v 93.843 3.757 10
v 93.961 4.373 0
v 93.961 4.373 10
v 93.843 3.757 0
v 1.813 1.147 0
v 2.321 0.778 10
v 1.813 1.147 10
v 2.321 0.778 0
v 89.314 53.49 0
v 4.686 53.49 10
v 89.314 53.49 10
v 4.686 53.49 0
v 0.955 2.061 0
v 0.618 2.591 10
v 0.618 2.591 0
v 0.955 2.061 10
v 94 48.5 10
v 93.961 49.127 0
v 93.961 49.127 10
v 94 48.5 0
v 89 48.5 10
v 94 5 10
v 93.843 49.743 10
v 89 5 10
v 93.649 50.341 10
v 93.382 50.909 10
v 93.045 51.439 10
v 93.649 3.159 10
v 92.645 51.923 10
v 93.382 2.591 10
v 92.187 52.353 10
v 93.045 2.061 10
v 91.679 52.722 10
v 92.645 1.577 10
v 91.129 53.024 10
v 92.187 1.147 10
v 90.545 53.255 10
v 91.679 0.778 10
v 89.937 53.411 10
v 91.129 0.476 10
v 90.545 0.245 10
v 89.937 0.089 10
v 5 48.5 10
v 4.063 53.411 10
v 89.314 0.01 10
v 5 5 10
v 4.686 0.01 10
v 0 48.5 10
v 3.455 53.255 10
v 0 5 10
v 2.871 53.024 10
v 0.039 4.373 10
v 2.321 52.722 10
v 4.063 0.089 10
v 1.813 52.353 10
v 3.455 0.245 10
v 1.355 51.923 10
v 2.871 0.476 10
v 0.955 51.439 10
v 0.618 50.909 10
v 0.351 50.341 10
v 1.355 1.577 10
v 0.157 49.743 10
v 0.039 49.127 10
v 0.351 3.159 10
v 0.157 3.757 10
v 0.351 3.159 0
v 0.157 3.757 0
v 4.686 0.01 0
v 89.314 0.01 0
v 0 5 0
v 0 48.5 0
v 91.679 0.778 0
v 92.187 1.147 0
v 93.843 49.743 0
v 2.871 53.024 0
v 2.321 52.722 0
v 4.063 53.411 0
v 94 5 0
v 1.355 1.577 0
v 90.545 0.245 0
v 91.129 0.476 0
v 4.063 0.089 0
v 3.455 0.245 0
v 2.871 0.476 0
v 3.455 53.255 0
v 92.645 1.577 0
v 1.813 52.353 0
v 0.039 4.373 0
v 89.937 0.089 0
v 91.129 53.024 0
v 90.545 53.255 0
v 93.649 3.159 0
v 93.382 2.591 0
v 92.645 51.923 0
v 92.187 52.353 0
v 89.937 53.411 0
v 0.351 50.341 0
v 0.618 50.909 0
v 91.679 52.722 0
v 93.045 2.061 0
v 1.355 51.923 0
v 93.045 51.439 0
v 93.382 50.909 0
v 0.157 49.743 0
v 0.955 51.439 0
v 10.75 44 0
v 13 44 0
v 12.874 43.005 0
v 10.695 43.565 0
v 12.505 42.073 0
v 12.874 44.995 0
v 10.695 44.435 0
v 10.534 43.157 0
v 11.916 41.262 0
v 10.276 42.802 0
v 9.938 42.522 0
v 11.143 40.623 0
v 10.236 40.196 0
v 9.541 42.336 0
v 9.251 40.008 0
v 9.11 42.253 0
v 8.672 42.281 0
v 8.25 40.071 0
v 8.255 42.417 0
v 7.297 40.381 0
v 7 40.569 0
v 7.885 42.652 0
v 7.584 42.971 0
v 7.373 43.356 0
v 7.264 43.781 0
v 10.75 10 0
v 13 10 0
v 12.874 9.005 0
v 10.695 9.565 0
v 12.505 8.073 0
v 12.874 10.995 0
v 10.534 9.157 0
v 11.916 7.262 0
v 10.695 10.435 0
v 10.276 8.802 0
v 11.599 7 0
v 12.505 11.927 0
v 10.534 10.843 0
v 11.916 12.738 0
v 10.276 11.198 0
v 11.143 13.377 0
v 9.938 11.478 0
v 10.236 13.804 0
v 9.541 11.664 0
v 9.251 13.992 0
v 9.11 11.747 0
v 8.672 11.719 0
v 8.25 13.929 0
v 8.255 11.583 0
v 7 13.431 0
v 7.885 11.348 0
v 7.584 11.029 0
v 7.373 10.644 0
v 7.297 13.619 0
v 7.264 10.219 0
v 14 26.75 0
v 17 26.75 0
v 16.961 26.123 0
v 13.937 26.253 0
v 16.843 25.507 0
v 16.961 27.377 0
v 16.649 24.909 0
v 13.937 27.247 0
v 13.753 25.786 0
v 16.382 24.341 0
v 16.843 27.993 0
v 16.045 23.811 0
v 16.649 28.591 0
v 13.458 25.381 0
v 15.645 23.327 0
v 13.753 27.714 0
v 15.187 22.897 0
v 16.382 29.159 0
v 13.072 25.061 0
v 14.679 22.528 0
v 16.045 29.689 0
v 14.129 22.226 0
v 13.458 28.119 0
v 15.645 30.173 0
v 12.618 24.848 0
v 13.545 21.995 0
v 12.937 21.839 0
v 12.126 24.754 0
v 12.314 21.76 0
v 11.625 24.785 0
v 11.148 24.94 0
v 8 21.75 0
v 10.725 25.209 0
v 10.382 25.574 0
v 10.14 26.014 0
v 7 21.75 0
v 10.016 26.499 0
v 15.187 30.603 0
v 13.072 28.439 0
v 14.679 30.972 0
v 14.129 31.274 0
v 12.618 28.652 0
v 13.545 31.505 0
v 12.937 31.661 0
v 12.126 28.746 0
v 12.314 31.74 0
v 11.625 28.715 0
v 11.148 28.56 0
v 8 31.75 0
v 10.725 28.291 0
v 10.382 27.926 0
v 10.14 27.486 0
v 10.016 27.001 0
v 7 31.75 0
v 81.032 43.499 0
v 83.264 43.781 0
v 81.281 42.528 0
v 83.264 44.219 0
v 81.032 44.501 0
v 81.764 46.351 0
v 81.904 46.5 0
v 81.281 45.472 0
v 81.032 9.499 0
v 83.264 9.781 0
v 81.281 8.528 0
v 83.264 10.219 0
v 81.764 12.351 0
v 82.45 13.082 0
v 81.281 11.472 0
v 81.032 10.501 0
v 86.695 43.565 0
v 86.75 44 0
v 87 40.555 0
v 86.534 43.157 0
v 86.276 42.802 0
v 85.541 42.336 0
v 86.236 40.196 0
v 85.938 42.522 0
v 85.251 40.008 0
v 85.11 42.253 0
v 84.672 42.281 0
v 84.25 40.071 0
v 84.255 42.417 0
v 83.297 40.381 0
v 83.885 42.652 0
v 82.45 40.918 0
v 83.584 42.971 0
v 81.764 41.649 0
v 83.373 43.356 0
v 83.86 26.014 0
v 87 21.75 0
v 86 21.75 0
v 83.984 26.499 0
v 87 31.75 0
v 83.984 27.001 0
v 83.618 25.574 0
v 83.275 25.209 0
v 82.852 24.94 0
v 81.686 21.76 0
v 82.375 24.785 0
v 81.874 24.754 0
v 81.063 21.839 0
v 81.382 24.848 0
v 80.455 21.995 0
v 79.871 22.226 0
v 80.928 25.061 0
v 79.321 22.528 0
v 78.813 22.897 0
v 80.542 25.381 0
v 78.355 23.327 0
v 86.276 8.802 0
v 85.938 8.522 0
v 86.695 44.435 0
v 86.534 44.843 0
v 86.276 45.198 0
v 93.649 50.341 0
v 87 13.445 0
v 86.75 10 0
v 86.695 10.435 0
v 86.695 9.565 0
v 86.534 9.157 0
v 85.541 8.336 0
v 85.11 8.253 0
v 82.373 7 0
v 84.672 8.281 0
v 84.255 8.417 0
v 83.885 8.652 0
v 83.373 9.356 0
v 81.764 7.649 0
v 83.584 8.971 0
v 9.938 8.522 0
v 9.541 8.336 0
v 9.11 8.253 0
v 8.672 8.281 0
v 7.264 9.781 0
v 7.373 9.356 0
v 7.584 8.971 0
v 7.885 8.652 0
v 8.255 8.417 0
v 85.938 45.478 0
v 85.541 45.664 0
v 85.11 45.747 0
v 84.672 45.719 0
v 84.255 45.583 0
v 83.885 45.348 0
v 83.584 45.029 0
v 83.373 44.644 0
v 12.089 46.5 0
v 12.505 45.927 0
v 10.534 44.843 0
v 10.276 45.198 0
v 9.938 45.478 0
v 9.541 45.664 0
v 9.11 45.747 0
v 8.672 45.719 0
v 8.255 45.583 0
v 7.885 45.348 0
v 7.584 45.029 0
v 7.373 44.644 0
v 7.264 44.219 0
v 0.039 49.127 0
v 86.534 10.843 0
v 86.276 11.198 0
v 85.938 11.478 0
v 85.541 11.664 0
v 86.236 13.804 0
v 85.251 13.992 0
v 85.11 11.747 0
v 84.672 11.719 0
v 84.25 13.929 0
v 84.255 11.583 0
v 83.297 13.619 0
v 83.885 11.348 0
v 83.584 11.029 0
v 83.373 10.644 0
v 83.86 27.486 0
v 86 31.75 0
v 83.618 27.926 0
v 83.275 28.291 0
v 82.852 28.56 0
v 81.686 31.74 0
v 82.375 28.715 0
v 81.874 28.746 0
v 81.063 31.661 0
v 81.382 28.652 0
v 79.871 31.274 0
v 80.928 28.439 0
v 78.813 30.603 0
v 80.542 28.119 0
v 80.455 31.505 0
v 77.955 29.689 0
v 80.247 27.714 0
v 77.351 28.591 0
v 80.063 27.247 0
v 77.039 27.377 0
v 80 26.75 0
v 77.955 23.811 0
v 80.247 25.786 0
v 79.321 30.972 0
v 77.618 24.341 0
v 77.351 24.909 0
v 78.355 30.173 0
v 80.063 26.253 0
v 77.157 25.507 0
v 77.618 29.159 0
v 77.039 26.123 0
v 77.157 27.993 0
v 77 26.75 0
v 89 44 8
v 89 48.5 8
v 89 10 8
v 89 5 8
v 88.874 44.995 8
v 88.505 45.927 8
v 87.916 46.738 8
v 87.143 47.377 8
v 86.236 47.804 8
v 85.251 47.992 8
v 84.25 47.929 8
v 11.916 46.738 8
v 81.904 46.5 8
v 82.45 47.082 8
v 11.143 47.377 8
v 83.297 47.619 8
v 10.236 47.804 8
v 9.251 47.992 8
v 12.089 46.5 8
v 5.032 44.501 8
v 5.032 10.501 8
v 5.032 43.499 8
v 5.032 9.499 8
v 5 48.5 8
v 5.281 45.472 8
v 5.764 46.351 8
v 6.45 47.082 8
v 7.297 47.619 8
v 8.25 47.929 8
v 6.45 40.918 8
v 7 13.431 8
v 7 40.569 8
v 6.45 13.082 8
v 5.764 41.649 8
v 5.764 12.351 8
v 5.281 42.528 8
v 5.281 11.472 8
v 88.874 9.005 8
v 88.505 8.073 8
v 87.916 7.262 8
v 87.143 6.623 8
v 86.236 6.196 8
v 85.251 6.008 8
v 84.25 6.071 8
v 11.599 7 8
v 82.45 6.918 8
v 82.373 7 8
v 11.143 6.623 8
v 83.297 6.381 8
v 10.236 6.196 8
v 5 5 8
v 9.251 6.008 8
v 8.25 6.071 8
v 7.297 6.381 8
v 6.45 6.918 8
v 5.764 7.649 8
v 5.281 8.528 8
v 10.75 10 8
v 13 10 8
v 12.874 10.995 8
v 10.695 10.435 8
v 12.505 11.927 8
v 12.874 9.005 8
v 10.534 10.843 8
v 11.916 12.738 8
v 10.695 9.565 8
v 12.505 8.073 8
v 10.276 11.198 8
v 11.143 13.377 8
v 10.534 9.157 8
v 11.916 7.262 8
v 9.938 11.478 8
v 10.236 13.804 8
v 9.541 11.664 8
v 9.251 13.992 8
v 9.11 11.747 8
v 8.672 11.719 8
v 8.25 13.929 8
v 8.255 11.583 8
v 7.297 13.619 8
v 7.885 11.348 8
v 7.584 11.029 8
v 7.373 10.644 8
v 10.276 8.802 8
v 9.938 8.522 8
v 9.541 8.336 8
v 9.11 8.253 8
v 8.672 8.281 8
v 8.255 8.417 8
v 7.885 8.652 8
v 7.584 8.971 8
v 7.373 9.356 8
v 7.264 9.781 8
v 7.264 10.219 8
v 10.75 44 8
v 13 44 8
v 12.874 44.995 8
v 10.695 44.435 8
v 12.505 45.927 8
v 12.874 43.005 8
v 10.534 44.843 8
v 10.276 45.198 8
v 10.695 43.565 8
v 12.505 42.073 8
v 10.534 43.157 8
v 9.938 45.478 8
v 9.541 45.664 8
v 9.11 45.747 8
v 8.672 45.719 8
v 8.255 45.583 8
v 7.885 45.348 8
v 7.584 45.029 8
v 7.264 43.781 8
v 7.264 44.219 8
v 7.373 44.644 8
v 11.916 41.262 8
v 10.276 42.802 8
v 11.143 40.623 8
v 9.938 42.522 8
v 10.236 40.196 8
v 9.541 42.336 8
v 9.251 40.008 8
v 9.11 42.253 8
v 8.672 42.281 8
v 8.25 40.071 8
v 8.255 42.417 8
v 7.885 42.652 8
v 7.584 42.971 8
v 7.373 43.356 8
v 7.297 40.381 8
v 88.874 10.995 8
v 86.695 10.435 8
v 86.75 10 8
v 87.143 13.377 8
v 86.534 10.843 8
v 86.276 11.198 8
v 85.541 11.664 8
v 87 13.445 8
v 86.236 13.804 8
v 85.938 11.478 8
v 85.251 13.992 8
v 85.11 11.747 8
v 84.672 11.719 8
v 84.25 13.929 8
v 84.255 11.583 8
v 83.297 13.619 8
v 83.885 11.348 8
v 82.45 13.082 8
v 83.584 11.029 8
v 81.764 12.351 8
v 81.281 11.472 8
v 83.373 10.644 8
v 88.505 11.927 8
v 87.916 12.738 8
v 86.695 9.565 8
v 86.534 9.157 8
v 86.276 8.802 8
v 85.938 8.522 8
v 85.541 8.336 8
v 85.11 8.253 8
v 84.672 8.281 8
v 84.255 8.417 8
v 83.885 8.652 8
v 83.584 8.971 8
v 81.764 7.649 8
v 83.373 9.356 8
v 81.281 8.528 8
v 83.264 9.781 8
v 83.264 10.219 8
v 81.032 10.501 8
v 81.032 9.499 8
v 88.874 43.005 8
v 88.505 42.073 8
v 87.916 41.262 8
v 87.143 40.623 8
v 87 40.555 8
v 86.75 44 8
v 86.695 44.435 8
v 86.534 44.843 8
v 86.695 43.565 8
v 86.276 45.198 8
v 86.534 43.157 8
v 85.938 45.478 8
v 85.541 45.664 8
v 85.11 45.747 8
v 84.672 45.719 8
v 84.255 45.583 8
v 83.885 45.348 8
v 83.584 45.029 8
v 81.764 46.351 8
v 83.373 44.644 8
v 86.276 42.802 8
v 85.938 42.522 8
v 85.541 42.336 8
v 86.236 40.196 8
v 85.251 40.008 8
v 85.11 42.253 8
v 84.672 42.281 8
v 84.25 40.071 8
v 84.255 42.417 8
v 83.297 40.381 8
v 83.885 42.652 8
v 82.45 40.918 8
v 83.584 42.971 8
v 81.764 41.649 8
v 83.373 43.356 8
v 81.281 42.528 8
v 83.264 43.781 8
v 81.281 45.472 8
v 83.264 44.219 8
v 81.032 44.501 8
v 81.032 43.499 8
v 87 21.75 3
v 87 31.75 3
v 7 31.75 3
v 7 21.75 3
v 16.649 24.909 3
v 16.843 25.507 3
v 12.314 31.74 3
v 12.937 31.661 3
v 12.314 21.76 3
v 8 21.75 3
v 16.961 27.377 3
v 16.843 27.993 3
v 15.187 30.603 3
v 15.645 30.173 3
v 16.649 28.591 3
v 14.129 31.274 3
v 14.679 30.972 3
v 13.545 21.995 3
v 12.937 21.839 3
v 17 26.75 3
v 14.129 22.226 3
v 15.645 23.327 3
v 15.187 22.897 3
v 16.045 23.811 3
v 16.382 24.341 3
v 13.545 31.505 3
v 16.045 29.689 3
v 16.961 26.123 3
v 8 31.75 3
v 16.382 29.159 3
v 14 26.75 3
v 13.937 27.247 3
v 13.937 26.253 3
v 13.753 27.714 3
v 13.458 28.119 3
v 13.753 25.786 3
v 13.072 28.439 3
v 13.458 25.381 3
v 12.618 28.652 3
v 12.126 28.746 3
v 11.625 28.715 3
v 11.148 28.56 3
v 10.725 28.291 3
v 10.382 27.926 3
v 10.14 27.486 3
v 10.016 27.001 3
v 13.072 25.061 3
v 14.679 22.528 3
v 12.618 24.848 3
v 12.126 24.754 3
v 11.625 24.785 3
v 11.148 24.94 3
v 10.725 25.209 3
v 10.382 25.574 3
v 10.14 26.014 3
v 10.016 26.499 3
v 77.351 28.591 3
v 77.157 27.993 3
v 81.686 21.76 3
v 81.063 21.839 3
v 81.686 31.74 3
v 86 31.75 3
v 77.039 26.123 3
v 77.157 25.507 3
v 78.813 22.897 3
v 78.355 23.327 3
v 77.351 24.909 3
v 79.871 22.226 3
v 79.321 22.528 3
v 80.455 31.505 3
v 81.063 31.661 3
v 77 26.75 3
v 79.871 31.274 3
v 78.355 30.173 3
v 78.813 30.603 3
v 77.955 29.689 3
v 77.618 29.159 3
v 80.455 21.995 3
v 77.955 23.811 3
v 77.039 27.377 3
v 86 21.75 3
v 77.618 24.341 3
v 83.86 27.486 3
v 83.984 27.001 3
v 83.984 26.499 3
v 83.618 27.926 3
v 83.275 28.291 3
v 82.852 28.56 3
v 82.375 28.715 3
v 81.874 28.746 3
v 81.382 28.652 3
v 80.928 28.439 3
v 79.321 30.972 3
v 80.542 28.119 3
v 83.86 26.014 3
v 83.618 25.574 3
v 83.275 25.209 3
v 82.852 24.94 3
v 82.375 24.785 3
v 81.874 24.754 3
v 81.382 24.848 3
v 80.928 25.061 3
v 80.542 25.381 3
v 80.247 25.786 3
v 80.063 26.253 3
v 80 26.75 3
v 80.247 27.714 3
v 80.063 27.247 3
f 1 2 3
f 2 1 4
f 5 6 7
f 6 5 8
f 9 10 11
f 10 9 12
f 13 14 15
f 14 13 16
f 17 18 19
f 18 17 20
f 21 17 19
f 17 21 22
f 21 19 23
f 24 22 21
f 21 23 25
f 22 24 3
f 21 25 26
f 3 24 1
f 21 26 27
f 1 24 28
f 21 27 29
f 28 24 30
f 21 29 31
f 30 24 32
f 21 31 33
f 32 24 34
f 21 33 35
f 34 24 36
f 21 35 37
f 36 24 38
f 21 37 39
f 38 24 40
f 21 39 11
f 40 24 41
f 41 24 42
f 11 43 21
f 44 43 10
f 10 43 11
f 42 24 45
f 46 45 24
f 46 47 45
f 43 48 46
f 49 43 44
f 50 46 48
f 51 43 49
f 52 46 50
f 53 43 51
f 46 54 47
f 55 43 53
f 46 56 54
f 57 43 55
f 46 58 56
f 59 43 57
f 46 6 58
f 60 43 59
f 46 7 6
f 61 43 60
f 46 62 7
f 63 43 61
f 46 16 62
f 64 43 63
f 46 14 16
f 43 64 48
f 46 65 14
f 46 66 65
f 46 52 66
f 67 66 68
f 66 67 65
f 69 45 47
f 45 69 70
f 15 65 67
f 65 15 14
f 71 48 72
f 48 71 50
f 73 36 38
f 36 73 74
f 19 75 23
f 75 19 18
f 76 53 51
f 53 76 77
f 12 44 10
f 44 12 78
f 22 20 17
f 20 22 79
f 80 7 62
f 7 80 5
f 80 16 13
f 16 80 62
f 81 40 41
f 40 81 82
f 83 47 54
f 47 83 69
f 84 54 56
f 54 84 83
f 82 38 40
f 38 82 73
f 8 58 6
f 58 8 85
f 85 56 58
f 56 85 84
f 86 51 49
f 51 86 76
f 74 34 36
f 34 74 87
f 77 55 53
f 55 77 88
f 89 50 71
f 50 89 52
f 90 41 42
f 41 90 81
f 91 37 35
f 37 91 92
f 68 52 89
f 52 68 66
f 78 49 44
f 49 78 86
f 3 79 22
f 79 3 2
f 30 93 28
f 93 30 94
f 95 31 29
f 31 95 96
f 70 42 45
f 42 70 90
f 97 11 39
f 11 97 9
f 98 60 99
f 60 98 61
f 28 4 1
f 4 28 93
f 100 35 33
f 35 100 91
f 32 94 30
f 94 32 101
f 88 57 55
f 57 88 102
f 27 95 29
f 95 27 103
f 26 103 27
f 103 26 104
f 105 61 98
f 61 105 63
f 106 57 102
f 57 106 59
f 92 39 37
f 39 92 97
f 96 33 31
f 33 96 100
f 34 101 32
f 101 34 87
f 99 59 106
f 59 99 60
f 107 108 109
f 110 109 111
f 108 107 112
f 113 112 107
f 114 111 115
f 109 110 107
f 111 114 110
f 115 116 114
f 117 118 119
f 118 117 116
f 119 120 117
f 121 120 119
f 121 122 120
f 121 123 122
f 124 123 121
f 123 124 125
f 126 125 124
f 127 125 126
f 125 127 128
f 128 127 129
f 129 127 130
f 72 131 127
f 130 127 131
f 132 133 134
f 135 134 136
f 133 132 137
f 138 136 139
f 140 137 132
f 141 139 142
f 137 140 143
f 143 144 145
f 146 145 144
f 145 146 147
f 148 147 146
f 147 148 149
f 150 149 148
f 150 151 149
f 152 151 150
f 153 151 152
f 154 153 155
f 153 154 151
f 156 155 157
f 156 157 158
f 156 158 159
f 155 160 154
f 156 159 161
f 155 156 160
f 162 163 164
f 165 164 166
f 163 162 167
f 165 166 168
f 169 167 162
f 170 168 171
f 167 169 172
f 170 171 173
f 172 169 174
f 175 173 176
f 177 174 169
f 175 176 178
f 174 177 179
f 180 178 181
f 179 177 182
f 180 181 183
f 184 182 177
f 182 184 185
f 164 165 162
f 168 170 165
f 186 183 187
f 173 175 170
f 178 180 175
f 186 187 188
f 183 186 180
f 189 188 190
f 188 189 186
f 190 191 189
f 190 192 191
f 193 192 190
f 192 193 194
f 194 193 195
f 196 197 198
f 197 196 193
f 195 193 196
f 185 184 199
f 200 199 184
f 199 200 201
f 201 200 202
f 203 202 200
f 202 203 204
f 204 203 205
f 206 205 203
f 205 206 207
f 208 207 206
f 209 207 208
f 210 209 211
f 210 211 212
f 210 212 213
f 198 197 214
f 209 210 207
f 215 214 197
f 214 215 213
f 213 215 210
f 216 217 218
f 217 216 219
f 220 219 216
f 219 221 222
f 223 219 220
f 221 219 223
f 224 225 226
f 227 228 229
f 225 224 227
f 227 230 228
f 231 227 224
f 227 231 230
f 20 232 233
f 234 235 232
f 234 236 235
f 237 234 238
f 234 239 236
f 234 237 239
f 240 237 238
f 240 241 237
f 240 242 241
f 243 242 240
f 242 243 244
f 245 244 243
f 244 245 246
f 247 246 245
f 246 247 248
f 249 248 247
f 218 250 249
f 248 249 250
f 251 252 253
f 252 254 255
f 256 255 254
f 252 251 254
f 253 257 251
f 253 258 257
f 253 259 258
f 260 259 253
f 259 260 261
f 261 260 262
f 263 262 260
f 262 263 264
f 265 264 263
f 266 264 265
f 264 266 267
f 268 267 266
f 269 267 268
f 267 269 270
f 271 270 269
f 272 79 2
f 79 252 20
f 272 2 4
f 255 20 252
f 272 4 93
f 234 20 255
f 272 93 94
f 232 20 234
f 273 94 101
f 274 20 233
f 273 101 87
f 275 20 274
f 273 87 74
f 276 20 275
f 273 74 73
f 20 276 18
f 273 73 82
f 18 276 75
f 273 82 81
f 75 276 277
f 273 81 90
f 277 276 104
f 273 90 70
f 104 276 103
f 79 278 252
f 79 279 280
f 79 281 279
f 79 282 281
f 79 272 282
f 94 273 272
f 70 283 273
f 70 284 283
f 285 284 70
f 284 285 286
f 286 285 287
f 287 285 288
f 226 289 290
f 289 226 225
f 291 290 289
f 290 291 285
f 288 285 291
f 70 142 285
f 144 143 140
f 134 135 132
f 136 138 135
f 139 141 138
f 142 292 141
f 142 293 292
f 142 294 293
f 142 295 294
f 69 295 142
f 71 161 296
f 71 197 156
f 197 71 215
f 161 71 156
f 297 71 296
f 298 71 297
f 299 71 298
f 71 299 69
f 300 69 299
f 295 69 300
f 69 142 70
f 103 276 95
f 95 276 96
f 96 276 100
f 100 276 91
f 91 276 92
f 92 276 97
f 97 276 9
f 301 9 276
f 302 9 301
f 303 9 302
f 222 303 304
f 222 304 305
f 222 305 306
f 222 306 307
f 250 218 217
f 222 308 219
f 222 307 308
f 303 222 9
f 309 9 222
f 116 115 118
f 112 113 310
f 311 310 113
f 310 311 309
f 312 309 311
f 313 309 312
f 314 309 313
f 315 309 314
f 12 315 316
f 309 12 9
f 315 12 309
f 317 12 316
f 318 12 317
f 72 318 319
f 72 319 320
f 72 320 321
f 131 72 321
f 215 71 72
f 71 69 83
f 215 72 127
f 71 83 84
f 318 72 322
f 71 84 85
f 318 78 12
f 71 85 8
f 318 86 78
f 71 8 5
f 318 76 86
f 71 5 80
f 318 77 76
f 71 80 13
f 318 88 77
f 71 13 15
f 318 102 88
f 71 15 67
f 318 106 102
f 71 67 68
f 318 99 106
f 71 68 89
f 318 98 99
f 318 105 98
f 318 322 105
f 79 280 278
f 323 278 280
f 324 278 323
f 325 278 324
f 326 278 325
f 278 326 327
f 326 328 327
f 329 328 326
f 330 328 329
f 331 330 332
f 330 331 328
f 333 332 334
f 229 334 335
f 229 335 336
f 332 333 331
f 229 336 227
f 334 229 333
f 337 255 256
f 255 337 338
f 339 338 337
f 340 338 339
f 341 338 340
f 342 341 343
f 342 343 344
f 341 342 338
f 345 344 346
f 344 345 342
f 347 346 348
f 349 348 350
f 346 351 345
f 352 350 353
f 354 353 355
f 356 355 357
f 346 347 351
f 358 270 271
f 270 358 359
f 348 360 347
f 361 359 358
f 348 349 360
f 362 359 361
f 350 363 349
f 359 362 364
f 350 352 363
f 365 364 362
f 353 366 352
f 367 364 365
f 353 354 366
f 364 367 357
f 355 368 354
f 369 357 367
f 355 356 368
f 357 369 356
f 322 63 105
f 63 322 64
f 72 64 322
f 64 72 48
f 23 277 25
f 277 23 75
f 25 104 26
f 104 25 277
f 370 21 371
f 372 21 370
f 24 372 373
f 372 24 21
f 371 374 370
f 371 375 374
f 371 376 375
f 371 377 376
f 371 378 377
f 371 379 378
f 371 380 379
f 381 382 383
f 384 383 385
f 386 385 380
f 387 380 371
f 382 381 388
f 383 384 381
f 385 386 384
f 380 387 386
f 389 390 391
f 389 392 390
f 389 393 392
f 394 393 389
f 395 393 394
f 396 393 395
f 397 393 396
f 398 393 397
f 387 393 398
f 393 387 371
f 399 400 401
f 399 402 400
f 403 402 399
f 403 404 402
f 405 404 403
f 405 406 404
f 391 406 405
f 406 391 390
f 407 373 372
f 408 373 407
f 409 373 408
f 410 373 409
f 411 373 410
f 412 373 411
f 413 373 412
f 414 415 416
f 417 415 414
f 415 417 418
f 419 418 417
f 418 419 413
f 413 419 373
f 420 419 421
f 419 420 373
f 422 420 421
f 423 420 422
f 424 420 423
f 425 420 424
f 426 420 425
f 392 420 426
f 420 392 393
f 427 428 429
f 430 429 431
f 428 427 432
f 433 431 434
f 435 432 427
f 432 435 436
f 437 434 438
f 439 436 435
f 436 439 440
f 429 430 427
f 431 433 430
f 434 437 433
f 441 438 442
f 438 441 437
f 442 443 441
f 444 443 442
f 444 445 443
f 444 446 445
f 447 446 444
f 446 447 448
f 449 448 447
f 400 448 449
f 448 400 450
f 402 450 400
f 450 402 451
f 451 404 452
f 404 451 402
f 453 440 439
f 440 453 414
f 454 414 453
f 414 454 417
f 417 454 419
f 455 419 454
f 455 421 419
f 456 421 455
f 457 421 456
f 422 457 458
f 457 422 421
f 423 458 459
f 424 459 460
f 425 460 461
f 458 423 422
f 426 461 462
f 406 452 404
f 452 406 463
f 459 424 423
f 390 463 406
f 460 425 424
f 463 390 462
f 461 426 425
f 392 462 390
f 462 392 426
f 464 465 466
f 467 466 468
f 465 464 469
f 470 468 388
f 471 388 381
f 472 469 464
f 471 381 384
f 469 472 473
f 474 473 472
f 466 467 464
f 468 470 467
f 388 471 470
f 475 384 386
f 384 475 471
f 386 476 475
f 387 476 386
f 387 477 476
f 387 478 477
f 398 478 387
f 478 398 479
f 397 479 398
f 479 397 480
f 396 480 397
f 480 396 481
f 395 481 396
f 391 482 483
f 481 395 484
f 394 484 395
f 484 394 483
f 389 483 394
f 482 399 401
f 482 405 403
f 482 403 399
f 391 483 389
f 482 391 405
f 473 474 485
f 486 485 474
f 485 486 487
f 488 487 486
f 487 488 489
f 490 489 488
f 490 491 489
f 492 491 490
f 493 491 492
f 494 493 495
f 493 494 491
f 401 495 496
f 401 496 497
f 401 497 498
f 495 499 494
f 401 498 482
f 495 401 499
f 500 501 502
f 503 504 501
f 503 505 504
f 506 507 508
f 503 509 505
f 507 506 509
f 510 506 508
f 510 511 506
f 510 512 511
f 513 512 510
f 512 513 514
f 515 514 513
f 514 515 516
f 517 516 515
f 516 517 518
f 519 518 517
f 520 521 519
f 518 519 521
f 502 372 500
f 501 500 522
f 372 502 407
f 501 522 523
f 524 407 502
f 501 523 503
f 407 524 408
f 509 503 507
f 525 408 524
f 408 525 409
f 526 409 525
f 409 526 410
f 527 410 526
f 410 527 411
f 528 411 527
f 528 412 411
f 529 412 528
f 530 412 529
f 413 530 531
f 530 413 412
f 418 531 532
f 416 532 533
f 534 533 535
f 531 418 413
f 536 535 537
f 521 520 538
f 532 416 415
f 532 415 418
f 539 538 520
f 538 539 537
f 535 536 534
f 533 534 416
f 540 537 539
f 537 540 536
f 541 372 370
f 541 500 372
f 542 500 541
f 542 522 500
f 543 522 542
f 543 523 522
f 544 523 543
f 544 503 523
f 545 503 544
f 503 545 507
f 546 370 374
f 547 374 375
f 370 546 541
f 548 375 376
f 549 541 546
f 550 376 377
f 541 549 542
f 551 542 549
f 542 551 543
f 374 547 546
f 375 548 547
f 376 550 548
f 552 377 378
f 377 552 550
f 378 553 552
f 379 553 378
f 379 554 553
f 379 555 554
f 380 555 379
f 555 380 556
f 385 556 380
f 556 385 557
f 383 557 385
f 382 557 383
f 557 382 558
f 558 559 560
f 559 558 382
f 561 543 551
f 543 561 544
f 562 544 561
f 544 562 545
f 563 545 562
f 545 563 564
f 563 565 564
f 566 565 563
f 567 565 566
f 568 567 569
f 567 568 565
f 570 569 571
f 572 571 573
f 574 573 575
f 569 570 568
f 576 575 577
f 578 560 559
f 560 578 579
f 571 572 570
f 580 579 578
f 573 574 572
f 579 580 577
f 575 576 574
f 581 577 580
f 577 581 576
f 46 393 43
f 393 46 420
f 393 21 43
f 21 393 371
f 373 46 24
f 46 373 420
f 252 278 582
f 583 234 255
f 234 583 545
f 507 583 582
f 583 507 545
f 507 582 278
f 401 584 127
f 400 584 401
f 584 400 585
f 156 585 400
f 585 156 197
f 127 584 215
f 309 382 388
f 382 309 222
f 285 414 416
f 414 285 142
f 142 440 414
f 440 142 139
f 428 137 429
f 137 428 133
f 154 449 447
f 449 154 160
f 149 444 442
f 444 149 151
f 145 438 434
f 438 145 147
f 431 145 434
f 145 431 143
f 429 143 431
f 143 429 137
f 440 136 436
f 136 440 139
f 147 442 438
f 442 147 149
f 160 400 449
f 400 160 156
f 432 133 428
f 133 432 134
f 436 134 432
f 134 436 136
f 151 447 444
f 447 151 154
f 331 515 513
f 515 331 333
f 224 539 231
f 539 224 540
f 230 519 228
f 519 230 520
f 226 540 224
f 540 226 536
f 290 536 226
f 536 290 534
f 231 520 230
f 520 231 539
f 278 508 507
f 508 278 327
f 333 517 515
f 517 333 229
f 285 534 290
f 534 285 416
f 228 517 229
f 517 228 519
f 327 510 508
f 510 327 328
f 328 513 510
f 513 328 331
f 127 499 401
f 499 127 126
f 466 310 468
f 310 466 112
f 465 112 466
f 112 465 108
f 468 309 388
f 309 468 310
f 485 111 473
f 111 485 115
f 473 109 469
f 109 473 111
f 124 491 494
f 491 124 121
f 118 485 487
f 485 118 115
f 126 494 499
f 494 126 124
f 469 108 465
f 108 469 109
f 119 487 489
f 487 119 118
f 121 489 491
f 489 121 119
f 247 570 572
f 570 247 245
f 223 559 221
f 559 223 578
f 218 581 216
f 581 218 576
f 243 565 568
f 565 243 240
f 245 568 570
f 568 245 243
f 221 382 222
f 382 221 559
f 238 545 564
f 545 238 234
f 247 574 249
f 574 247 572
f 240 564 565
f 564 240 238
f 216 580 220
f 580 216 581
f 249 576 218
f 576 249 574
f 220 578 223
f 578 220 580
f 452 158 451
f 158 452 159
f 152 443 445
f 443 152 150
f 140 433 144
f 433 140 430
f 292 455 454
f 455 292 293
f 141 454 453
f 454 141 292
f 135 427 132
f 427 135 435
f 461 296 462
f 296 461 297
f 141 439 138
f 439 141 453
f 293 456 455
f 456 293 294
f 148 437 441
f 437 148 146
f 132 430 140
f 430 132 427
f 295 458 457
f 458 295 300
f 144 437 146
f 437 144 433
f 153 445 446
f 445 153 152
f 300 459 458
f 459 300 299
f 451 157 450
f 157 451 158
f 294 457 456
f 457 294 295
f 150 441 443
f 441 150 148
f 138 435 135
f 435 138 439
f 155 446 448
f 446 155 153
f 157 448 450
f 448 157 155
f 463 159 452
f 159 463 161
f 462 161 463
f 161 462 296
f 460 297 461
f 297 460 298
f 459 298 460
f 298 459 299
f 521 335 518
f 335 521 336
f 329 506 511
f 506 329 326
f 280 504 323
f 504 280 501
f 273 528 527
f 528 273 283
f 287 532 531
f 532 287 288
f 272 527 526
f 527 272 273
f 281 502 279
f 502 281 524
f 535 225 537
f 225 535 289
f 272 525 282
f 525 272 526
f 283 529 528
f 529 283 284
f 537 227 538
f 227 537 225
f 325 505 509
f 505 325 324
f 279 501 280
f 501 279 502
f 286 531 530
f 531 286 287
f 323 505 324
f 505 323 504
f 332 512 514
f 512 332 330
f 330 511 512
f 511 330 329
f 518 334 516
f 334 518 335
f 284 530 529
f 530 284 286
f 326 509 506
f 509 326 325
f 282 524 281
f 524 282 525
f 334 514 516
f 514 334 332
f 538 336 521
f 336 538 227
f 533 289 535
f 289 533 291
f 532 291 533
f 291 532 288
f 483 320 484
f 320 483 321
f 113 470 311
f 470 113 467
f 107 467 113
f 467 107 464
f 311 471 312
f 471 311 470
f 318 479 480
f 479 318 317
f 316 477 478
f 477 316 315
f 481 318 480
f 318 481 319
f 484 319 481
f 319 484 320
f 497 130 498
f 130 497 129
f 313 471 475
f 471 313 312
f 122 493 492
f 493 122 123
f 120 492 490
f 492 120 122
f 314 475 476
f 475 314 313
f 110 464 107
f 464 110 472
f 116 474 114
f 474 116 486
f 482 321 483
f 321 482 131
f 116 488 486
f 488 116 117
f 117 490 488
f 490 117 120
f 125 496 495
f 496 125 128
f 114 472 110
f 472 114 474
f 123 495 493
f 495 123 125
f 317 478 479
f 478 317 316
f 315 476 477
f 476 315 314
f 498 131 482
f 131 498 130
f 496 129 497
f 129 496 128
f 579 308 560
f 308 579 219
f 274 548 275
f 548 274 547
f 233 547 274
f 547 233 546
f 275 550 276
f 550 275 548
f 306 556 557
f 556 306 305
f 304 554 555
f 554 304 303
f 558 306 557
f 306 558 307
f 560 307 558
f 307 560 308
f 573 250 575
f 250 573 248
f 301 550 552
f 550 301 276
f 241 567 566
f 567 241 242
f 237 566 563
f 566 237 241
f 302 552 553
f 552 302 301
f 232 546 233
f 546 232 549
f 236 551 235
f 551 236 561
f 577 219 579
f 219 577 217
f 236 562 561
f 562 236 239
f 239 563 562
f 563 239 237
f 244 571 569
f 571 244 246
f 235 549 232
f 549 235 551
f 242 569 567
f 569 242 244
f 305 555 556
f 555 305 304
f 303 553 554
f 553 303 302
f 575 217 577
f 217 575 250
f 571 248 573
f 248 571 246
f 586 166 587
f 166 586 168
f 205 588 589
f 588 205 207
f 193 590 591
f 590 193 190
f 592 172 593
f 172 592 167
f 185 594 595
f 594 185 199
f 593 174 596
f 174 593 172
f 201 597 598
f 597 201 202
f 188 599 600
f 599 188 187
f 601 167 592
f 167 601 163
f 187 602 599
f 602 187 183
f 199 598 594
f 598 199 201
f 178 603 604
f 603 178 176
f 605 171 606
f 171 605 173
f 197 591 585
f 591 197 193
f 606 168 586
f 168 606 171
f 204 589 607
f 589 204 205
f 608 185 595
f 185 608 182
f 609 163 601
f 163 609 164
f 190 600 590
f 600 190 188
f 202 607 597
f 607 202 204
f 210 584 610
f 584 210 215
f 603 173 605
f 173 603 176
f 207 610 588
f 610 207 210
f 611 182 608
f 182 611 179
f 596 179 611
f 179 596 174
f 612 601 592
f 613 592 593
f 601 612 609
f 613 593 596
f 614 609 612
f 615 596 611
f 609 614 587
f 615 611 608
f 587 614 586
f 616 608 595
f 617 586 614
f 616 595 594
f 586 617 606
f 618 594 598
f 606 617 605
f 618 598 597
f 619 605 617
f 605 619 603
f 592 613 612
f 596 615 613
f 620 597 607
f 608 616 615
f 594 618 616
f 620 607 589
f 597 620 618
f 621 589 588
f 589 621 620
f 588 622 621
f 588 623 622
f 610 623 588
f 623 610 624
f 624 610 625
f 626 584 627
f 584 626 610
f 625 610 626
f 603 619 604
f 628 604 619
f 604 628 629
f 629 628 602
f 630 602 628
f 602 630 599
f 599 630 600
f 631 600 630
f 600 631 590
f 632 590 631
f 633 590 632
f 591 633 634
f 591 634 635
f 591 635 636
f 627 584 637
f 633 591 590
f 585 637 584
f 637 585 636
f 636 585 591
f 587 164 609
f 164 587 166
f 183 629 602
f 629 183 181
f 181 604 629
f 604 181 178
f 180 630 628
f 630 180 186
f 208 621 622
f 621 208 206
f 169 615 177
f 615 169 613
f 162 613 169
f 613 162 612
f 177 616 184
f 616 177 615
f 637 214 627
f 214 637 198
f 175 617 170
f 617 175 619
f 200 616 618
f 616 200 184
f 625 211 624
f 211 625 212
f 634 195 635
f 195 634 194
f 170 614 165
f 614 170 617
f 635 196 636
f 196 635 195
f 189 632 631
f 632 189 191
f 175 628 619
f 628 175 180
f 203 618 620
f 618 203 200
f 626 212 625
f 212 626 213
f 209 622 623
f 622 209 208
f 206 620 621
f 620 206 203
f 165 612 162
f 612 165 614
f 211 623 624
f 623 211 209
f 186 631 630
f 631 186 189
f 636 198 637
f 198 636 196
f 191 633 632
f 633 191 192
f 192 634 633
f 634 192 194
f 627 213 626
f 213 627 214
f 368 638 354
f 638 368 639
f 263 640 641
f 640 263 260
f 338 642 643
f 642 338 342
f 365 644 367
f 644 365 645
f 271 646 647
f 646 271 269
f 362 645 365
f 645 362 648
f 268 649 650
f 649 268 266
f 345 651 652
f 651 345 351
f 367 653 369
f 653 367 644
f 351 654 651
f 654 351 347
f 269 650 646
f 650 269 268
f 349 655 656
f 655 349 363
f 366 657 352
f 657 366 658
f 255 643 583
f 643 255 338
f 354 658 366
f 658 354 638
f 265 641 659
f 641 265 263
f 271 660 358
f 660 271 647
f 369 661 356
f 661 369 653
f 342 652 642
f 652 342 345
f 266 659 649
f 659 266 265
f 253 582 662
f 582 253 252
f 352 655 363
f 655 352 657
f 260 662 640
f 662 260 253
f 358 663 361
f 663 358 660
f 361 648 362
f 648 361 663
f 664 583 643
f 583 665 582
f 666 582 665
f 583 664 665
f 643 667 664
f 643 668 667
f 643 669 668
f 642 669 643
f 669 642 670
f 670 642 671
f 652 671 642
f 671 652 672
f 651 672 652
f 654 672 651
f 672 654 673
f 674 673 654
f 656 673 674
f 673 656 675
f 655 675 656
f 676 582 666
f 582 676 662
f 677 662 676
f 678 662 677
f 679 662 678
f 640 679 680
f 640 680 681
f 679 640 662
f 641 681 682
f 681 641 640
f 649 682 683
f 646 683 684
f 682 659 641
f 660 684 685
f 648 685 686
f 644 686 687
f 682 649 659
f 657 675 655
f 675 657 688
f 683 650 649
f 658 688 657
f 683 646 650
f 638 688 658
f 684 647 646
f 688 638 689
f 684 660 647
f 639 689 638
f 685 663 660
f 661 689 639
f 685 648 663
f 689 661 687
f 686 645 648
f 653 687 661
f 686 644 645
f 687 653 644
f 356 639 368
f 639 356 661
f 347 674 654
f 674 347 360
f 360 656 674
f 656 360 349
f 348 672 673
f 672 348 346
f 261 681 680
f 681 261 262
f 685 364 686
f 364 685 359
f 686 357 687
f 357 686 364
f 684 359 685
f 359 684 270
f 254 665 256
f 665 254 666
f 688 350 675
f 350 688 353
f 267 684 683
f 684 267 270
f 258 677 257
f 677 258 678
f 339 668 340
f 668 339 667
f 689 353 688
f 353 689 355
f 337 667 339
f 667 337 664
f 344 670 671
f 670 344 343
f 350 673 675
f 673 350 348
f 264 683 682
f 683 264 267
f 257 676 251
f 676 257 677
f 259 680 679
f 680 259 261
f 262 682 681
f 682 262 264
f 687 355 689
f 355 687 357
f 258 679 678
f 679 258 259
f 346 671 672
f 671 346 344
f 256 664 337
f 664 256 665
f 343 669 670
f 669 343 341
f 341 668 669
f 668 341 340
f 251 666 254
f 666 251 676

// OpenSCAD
//Polargraph stepper board v2.1 mount
//Copyright Mark Benson 2016 CCNC 2016

//body
difference()
{
    union()
    {
        hull()
        {
            translate([5,5,0])
            cylinder(d=10,h=10,$fn=50);
    
            translate([5,43.5+5,0])
            cylinder(d=10,h=10,$fn=50);
        
        translate([84+5,43.5+5,0])
        cylinder(d=10,h=10,$fn=50);
    
        translate([84+5,5,0])
        cylinder(d=10,h=10,$fn=50);
    }//end hull
    
    }//end union
    
    //pcb lip
    translate([5,5,8])
    cube([84,43.5,12]);
    
    //centre cutout
    translate([5+2,5+2,0])
    cube([84-4,43.5-4,12]);
}  


//pcb mount tabs
difference()
{
    //tabs
    union()
    {
        //Bottom left
        translate([5+4,5+5,0])
        cylinder(d=8,h=8,$fn=25);
        
        //Bottom right
        translate([5+4+76,5+5,0])
        cylinder(d=8,h=8,$fn=25);
        
        //Top left
        translate([5+4,5+5+34,0])
        cylinder(d=8,h=8,$fn=25);
        
        //Top right
        translate([5+4+76,5+5+34,0])
        cylinder(d=8,h=8,$fn=25);
    }
    
    //screw holes
    union()
    {
        //Bottom left
        translate([5+4,5+5,0])
        cylinder(d=3.5,h=12,$fn=25);
        
        //Bottom right
        translate([5+4+76,5+5,0])
        cylinder(d=3.5,h=12,$fn=25);
        
        //Top left
        translate([5+4,5+5+34,0])
        cylinder(d=3.5,h=12,$fn=25);
        
        //Top right
        translate([5+4+76,5+5+34,0])
        cylinder(d=3.5,h=12,$fn=25);
    }
}



//inner self tapper screw tab left
translate([7,(43.5)/2,0]) 
difference()
{
    //tab
    hull()
    {
        translate([5,5,0])
        cylinder(d=10,h=3,$fn=50);

        translate([0,0,0])
        cube([1,10,3]);
    }

    //screw hole
    translate([5,5,0])
    cylinder(d=4,h=3,$fn=25);
}

//inner self tapper screw tab right
translate([84+3,10+(43.5/2),0])
rotate([0,0,180])
difference()
{
    //tab
    hull()
    {
        translate([5,5,0])
        cylinder(d=10,h=3,$fn=50);

        translate([0,0,0])
        cube([1,10,3]);
    }

    //screw hole
    translate([5,5,0])
    cylinder(d=4,h=3,$fn=25);
}
